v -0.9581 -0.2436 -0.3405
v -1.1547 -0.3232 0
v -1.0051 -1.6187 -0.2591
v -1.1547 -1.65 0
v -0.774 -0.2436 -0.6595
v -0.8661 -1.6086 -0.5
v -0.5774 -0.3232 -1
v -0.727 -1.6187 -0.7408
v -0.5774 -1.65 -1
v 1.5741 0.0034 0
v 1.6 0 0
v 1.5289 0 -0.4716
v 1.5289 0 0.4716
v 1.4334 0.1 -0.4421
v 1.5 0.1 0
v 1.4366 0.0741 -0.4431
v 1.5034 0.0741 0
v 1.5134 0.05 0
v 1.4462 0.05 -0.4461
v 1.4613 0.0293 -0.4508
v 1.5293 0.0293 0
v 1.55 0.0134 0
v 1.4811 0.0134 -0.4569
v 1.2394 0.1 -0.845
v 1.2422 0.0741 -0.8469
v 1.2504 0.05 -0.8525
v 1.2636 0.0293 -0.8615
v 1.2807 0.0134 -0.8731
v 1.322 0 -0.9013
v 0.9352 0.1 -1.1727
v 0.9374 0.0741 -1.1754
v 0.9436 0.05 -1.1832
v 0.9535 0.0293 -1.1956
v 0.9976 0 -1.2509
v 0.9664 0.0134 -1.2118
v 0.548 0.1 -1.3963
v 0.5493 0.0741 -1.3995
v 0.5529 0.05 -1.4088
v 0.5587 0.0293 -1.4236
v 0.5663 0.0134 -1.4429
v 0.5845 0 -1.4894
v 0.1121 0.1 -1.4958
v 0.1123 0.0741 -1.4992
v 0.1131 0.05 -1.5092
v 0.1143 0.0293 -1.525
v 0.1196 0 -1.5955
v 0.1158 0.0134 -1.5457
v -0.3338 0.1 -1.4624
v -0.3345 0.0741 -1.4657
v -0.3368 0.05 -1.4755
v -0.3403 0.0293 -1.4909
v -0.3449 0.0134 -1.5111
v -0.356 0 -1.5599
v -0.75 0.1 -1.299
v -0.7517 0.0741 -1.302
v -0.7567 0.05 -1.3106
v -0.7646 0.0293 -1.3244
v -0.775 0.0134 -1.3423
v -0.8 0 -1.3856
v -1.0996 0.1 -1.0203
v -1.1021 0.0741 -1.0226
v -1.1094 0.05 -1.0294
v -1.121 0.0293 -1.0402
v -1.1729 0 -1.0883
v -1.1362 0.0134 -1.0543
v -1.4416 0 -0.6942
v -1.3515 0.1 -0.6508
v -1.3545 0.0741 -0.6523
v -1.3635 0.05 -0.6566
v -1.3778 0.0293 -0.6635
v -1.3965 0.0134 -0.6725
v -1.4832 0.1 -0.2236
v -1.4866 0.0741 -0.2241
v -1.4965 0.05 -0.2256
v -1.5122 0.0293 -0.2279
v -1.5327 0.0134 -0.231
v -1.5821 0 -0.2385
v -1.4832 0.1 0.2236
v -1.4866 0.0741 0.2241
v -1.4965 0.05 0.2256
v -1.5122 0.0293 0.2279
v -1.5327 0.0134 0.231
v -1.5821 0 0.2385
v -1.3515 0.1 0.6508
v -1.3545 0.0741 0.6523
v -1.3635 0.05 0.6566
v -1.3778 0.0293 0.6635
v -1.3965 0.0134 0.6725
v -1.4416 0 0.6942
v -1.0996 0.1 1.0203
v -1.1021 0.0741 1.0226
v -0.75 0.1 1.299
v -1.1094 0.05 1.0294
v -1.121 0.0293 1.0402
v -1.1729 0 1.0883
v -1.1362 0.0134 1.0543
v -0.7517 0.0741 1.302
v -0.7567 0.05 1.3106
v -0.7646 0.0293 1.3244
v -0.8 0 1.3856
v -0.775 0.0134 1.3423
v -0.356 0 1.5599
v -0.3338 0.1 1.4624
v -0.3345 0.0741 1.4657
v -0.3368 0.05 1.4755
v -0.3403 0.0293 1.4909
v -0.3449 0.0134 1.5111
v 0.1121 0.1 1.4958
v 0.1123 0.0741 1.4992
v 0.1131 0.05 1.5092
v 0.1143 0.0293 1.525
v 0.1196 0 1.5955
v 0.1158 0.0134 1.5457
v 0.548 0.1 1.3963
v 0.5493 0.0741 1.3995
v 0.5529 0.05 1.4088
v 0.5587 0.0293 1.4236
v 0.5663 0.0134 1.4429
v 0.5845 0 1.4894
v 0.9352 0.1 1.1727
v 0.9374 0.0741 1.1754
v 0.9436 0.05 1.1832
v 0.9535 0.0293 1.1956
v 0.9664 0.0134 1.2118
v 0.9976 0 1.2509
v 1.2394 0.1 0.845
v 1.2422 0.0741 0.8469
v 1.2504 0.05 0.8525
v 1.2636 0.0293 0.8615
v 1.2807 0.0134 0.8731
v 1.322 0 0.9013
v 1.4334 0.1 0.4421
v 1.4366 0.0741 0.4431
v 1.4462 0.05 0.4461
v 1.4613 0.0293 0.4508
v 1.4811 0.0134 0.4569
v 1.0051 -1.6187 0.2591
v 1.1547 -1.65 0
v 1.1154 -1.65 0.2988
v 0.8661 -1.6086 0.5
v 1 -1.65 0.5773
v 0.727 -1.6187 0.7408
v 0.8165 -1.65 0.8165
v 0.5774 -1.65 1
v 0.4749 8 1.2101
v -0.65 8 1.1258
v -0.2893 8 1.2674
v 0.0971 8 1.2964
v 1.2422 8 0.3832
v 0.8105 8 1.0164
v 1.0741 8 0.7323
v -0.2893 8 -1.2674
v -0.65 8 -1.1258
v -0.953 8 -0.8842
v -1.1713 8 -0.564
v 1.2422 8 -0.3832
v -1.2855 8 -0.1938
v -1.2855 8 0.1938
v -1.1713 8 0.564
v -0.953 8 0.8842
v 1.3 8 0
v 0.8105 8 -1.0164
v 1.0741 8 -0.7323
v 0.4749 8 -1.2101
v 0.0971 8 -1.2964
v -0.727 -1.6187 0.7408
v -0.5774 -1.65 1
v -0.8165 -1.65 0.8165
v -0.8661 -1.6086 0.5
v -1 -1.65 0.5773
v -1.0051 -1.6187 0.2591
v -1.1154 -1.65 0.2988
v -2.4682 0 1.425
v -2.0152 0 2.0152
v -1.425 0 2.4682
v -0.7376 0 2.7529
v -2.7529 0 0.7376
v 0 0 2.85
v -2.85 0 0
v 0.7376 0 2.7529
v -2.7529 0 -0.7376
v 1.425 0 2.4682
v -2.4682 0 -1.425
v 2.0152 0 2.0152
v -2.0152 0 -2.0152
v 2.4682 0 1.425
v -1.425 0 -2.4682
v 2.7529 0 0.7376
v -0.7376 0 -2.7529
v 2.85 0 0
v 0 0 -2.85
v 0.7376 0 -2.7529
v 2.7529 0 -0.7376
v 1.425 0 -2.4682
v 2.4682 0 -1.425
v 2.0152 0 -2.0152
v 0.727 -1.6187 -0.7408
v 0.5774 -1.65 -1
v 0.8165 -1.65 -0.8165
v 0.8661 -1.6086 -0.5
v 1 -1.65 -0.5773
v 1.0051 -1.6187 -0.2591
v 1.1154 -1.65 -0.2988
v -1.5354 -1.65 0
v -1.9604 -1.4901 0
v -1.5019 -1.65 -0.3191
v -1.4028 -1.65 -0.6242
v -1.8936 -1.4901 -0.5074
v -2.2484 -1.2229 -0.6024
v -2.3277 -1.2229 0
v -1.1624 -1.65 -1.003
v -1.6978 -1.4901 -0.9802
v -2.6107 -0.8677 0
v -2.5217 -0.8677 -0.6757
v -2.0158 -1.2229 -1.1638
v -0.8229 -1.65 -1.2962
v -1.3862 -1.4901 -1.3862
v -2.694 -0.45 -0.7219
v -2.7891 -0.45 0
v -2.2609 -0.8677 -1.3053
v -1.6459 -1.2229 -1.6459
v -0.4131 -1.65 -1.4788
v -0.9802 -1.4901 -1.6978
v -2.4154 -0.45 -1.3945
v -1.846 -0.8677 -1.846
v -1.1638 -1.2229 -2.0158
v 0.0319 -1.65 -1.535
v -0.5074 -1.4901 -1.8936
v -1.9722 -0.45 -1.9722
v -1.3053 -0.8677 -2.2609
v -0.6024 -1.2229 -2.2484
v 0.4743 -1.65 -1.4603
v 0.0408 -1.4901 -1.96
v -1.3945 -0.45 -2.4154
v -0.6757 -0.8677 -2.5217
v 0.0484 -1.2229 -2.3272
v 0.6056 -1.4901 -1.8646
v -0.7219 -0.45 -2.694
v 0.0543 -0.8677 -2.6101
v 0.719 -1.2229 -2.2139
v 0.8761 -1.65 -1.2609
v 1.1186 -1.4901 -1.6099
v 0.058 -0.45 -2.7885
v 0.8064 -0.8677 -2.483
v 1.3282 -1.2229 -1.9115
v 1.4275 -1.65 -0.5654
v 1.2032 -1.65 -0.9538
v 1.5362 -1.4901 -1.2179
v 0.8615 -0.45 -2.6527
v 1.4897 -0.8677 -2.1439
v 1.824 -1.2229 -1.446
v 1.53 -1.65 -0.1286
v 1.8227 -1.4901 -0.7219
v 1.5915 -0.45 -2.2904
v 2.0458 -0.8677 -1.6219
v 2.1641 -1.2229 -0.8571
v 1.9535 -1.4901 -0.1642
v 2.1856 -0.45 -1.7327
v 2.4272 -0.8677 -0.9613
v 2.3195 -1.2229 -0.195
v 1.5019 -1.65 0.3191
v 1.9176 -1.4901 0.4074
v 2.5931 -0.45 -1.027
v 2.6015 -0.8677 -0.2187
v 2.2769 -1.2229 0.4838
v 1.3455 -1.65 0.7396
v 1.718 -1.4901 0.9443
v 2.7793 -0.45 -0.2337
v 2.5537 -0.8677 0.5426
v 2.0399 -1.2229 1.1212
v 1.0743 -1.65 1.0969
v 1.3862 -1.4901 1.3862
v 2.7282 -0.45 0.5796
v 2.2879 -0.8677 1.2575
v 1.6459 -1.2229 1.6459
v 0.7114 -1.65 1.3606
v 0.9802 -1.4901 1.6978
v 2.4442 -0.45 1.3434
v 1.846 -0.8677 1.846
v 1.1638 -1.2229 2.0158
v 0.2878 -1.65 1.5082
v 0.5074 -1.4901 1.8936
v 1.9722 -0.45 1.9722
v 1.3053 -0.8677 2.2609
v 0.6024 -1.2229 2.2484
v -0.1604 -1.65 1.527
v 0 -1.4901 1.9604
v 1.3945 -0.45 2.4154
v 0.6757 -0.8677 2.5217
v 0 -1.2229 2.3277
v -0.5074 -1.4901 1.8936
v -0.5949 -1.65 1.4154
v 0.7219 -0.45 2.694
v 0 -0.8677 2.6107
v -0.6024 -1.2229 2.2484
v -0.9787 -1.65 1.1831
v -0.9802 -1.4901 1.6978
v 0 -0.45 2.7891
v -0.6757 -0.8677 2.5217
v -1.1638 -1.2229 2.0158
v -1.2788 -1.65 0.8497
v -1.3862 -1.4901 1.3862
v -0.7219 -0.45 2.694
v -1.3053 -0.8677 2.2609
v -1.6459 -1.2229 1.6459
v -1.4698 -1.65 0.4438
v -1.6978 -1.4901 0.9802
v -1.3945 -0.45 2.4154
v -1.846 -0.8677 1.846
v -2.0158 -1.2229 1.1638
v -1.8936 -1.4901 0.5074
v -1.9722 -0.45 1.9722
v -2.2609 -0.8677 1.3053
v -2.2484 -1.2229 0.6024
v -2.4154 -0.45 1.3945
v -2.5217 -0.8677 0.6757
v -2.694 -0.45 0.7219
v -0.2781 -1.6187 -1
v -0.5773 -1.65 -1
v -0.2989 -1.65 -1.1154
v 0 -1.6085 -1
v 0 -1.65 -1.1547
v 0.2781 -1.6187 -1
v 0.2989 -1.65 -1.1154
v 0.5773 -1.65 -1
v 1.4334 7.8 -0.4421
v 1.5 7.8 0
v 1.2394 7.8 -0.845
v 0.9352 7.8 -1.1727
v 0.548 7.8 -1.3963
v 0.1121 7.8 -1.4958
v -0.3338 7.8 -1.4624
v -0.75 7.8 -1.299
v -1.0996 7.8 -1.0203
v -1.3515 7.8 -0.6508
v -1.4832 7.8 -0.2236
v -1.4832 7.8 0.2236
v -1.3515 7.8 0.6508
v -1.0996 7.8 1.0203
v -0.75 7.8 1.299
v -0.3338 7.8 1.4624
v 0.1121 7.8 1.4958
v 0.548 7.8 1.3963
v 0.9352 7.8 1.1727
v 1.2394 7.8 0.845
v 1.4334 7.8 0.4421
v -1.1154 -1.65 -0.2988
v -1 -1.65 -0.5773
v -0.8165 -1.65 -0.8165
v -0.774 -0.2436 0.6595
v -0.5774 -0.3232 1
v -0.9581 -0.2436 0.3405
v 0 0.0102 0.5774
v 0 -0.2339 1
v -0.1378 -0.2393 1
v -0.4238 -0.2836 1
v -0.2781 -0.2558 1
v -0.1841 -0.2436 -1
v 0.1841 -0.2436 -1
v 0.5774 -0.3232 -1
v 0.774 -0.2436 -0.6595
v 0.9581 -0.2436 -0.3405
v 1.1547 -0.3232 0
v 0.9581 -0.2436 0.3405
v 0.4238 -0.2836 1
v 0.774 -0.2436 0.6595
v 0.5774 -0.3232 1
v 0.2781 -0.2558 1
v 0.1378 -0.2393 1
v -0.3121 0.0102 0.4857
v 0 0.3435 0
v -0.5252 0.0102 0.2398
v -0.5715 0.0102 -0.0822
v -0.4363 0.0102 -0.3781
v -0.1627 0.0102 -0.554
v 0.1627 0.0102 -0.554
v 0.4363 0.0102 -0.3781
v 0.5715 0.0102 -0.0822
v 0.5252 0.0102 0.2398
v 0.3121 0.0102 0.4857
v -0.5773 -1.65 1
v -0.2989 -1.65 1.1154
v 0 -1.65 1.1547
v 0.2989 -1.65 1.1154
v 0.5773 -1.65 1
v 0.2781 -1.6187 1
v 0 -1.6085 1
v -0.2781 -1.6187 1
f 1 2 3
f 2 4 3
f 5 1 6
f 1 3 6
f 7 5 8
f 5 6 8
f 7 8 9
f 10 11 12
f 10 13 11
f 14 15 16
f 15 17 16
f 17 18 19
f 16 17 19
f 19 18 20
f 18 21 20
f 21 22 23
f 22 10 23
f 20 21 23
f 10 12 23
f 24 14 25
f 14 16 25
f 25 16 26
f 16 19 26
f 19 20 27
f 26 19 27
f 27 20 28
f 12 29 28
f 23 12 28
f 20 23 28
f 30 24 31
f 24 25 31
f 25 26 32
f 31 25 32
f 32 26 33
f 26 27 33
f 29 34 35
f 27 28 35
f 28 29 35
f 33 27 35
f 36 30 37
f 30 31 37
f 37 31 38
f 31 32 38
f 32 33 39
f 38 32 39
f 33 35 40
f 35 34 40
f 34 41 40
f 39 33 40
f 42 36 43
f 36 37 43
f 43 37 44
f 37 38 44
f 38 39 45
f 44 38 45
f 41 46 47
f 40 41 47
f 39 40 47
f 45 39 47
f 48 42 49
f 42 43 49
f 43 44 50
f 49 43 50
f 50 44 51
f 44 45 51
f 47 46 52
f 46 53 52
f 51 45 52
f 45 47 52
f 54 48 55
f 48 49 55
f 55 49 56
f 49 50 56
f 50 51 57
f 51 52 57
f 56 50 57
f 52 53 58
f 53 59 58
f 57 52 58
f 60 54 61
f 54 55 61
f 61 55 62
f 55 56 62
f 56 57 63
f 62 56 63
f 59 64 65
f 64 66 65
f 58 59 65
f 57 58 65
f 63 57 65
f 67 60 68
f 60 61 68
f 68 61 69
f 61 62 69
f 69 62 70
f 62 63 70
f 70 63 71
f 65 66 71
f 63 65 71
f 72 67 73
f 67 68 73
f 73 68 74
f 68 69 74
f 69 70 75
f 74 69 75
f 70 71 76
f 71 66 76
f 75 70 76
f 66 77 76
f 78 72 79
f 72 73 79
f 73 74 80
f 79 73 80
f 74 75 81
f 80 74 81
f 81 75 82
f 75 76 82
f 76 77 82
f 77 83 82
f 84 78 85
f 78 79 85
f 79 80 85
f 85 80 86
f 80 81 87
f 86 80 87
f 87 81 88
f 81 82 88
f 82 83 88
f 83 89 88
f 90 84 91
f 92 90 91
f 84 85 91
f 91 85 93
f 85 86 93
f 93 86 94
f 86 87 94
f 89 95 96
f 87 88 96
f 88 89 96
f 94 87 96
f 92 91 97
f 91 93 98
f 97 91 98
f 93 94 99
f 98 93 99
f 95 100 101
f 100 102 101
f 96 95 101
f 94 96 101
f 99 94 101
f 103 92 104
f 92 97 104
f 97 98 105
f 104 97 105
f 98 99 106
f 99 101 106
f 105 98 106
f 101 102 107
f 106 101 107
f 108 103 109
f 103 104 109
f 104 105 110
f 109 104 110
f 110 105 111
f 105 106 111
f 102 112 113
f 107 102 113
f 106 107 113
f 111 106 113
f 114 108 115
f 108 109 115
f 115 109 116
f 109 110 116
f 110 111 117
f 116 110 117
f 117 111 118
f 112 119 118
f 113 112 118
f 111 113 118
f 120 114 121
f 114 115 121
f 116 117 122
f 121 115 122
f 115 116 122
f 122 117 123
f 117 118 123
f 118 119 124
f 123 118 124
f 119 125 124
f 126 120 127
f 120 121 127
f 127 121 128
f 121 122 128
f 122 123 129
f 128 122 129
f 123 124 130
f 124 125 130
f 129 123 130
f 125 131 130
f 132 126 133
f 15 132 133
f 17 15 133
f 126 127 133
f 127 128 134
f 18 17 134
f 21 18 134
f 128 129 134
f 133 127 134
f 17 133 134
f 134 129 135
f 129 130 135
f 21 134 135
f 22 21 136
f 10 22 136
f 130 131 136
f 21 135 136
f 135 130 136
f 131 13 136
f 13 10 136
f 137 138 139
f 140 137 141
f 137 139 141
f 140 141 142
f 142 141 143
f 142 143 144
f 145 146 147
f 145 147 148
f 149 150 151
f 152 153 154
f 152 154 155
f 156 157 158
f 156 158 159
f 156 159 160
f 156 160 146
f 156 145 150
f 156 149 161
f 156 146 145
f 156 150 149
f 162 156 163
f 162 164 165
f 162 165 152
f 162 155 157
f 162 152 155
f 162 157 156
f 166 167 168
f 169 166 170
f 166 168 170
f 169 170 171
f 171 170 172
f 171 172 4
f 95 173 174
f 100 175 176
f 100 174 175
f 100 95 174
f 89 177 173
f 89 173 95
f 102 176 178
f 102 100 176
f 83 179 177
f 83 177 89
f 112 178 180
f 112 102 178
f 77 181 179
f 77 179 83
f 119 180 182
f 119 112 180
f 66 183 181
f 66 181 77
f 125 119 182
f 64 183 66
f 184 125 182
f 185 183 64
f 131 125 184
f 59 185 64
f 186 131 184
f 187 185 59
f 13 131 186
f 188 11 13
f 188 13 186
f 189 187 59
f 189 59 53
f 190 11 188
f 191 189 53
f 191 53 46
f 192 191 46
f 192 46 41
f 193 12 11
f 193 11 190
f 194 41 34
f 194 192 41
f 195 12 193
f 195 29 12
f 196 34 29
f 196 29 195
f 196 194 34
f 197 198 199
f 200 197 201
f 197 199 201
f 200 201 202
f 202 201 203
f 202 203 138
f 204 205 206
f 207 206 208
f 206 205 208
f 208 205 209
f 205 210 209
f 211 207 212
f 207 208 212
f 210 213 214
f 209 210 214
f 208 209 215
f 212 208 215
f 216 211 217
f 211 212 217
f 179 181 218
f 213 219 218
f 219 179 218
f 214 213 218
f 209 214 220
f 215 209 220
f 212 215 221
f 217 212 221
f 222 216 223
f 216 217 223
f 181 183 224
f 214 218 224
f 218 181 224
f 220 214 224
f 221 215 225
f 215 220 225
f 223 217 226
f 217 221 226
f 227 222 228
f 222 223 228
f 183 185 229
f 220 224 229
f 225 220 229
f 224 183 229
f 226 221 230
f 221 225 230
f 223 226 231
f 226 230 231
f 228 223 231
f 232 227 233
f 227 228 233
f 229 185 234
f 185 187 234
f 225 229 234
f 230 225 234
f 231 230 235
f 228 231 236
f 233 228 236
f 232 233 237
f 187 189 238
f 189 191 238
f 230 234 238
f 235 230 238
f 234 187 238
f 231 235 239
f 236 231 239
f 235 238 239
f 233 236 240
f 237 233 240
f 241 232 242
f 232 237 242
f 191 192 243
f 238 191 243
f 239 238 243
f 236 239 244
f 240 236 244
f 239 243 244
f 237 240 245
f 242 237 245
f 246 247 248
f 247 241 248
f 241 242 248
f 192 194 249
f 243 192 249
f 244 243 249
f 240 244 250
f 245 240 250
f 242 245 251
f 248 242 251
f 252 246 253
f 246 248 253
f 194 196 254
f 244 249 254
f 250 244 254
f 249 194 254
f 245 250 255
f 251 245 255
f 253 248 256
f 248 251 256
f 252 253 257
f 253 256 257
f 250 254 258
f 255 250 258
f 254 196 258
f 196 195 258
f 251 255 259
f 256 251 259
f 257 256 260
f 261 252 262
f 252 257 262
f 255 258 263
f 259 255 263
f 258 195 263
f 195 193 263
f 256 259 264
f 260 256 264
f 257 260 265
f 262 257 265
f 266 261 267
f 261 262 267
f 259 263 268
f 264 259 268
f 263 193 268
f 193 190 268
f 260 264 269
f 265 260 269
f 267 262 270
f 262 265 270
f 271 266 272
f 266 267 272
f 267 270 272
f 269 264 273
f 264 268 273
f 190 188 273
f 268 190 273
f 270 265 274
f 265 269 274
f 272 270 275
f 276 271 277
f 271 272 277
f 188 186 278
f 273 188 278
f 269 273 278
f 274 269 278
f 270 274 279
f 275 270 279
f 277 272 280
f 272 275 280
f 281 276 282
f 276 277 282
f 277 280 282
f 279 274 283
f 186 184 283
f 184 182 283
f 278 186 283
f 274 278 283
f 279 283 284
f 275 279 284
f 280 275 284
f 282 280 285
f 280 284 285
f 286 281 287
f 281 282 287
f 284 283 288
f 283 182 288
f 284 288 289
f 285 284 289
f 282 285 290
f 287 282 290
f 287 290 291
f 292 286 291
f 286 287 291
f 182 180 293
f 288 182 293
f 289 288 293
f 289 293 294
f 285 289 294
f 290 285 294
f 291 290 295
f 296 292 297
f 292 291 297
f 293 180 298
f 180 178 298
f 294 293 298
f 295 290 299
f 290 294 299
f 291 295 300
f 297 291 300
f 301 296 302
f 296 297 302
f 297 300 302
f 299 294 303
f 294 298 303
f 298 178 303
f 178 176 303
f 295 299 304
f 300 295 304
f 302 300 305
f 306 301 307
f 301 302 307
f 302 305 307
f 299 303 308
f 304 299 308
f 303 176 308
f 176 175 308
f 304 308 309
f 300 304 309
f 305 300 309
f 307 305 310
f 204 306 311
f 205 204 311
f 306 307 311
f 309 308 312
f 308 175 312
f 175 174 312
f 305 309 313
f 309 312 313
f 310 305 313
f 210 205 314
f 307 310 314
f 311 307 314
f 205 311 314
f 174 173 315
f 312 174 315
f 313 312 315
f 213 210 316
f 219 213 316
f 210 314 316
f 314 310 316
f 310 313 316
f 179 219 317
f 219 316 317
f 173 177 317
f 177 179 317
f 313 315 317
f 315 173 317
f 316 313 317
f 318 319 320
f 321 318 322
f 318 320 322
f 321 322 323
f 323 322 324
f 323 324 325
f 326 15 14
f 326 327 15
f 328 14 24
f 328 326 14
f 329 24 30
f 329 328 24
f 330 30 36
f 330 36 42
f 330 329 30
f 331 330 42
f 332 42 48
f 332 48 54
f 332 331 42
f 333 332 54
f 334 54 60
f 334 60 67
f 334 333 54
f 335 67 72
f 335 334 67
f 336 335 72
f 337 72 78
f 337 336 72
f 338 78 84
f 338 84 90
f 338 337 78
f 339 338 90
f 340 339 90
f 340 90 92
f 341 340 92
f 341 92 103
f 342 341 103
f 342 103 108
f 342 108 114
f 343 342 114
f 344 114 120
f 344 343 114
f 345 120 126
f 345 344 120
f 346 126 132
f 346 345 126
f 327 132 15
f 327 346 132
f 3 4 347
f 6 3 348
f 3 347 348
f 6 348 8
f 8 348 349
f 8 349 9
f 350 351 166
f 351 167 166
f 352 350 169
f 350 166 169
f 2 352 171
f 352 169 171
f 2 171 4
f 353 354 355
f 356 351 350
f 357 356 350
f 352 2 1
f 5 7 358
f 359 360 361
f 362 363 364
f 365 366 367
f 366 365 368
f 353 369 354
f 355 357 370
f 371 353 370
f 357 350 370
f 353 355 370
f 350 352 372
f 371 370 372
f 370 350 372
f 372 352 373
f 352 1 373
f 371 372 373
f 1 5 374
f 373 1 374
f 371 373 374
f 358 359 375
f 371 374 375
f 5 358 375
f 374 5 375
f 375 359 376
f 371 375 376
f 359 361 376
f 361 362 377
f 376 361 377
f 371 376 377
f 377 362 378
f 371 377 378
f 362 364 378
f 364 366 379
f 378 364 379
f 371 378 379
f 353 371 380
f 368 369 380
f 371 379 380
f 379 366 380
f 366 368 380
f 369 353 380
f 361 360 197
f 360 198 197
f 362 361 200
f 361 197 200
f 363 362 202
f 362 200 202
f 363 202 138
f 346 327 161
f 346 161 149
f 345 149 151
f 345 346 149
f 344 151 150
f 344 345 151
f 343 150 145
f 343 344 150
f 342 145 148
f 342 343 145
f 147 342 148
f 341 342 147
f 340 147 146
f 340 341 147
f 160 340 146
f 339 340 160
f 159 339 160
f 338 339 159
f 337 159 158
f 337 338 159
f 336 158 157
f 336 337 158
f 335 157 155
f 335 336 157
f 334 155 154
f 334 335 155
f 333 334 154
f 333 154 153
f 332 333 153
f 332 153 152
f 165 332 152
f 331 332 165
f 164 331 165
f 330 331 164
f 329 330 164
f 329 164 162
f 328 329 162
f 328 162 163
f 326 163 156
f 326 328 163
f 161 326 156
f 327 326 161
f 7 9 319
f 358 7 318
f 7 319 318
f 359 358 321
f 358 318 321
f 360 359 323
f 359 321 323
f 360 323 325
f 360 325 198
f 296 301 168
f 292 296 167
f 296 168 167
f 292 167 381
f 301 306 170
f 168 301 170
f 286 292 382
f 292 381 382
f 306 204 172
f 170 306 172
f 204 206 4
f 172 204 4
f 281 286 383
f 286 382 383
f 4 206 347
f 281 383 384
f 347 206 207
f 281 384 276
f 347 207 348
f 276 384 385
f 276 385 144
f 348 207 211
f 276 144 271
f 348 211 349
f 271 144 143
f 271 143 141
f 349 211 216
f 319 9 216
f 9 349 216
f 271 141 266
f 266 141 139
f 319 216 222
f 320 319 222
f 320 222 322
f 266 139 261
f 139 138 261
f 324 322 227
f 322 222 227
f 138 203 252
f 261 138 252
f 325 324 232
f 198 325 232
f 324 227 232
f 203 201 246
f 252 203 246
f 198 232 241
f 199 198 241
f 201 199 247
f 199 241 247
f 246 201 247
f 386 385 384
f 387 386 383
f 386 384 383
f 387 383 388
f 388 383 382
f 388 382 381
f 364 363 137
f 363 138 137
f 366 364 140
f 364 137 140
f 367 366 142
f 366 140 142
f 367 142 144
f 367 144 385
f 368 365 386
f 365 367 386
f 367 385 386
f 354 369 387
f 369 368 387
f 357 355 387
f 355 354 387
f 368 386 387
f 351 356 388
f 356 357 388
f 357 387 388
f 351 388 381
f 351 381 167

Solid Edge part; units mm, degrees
sketch "Sketch1" plane through (0, 0, 0) normal (0, 0, 1) x (1, 0, 0)
  line L0 (1.5, 0) -> (1.5, 8)
  line L1 (0, 8) -> (1.5, 8)
  line L2 (0, 0) -> (0, 8)
  line L3 (0, 0) -> (0, -1.65)
  line L4 (0, -1.65) -> (2.85, -1.65)
  line L5 (2.85, -1.65) -> (2.85, 0)
  line L6 (2.85, 0) -> (1.5, 0)
revolve "RevolvedProtrusion1" add sketch "Sketch1" angle 360 about axis through (0, 0, 0) along (0, 1, 0)
sketch "Sketch2" plane through (0, 0, 0) normal (1, 0, 0) x (0, 1, 0)
  line L0 (-1.65, 1.6515) -> (-0.61, 1.6515)
  line L1 (0.3435, 0) -> (-0.61, 1.6515)
  line L2 (-1.65, 0) -> (0.3435, 0)
  line L3 (-1.65, 0) -> (-1.65, 1.6515)
revolve "RevolvedCutout1" cut sketch "Sketch2" angle 360 about axis through (0, -4.5, 0) along (0, 1, 0)
sketch "Sketch3" plane through (0, -1.65, 0) normal (0, -1, 0) x (0, 0, 1)
  circle A0 centre (0, 0) radius 1.6515
  line L0 (-1, -0.5774) -> (0, -1.1547)
  line L1 (0, -1.1547) -> (1, -0.5774)
  line L2 (1, -0.5774) -> (1, 0.5774)
  line L3 (1, 0.5774) -> (0, 1.1547)
  line L4 (0, 1.1547) -> (-1, 0.5774)
  line L5 (-1, 0.5774) -> (-1, -0.5774)
  dimension "D1" = 2
extrude "Protrusion1" add sketch "Sketch3" against normal up to next
sketch "Sketch4" plane through (0, 0, 0) normal (0, 0, 1) x (1, 0, 0)
  line L0 (-1.1547, -1.65) -> (0, -1.65)
  line L1 (0, -1.65) -> (0, -1.3406)
  line L2 (0, -1.3406) -> (-1.1547, -1.65)
revolve "RevolvedCutout2" cut sketch "Sketch4" angle 360 about axis through (0, -4.5, 0) along (0, 1, 0)
fillet "Round1" radius 0.1 1 edges at (0, 0, -1.5)
chamfer "倒斜角_2" distance 0.2 angle 45 1 edges at (0, 8, -1.5)
cosmetic_thread "螺纹_3" size "M3" thread depth 7
sketch "Sketch5" plane through (0, 0, 0) normal (0, 0, 1) x (1, 0, 0)
  arc A0 (-1.5353, -1.65) -> (-2.85, 0) centre (-1.1572, 0) cw
revolve "RevolvedCutout3" cut sketch "Sketch5" angle 360 about axis through (0, 0, 0) along (0, -1, 0) material side at (-2.5202, -1.086, 0)
